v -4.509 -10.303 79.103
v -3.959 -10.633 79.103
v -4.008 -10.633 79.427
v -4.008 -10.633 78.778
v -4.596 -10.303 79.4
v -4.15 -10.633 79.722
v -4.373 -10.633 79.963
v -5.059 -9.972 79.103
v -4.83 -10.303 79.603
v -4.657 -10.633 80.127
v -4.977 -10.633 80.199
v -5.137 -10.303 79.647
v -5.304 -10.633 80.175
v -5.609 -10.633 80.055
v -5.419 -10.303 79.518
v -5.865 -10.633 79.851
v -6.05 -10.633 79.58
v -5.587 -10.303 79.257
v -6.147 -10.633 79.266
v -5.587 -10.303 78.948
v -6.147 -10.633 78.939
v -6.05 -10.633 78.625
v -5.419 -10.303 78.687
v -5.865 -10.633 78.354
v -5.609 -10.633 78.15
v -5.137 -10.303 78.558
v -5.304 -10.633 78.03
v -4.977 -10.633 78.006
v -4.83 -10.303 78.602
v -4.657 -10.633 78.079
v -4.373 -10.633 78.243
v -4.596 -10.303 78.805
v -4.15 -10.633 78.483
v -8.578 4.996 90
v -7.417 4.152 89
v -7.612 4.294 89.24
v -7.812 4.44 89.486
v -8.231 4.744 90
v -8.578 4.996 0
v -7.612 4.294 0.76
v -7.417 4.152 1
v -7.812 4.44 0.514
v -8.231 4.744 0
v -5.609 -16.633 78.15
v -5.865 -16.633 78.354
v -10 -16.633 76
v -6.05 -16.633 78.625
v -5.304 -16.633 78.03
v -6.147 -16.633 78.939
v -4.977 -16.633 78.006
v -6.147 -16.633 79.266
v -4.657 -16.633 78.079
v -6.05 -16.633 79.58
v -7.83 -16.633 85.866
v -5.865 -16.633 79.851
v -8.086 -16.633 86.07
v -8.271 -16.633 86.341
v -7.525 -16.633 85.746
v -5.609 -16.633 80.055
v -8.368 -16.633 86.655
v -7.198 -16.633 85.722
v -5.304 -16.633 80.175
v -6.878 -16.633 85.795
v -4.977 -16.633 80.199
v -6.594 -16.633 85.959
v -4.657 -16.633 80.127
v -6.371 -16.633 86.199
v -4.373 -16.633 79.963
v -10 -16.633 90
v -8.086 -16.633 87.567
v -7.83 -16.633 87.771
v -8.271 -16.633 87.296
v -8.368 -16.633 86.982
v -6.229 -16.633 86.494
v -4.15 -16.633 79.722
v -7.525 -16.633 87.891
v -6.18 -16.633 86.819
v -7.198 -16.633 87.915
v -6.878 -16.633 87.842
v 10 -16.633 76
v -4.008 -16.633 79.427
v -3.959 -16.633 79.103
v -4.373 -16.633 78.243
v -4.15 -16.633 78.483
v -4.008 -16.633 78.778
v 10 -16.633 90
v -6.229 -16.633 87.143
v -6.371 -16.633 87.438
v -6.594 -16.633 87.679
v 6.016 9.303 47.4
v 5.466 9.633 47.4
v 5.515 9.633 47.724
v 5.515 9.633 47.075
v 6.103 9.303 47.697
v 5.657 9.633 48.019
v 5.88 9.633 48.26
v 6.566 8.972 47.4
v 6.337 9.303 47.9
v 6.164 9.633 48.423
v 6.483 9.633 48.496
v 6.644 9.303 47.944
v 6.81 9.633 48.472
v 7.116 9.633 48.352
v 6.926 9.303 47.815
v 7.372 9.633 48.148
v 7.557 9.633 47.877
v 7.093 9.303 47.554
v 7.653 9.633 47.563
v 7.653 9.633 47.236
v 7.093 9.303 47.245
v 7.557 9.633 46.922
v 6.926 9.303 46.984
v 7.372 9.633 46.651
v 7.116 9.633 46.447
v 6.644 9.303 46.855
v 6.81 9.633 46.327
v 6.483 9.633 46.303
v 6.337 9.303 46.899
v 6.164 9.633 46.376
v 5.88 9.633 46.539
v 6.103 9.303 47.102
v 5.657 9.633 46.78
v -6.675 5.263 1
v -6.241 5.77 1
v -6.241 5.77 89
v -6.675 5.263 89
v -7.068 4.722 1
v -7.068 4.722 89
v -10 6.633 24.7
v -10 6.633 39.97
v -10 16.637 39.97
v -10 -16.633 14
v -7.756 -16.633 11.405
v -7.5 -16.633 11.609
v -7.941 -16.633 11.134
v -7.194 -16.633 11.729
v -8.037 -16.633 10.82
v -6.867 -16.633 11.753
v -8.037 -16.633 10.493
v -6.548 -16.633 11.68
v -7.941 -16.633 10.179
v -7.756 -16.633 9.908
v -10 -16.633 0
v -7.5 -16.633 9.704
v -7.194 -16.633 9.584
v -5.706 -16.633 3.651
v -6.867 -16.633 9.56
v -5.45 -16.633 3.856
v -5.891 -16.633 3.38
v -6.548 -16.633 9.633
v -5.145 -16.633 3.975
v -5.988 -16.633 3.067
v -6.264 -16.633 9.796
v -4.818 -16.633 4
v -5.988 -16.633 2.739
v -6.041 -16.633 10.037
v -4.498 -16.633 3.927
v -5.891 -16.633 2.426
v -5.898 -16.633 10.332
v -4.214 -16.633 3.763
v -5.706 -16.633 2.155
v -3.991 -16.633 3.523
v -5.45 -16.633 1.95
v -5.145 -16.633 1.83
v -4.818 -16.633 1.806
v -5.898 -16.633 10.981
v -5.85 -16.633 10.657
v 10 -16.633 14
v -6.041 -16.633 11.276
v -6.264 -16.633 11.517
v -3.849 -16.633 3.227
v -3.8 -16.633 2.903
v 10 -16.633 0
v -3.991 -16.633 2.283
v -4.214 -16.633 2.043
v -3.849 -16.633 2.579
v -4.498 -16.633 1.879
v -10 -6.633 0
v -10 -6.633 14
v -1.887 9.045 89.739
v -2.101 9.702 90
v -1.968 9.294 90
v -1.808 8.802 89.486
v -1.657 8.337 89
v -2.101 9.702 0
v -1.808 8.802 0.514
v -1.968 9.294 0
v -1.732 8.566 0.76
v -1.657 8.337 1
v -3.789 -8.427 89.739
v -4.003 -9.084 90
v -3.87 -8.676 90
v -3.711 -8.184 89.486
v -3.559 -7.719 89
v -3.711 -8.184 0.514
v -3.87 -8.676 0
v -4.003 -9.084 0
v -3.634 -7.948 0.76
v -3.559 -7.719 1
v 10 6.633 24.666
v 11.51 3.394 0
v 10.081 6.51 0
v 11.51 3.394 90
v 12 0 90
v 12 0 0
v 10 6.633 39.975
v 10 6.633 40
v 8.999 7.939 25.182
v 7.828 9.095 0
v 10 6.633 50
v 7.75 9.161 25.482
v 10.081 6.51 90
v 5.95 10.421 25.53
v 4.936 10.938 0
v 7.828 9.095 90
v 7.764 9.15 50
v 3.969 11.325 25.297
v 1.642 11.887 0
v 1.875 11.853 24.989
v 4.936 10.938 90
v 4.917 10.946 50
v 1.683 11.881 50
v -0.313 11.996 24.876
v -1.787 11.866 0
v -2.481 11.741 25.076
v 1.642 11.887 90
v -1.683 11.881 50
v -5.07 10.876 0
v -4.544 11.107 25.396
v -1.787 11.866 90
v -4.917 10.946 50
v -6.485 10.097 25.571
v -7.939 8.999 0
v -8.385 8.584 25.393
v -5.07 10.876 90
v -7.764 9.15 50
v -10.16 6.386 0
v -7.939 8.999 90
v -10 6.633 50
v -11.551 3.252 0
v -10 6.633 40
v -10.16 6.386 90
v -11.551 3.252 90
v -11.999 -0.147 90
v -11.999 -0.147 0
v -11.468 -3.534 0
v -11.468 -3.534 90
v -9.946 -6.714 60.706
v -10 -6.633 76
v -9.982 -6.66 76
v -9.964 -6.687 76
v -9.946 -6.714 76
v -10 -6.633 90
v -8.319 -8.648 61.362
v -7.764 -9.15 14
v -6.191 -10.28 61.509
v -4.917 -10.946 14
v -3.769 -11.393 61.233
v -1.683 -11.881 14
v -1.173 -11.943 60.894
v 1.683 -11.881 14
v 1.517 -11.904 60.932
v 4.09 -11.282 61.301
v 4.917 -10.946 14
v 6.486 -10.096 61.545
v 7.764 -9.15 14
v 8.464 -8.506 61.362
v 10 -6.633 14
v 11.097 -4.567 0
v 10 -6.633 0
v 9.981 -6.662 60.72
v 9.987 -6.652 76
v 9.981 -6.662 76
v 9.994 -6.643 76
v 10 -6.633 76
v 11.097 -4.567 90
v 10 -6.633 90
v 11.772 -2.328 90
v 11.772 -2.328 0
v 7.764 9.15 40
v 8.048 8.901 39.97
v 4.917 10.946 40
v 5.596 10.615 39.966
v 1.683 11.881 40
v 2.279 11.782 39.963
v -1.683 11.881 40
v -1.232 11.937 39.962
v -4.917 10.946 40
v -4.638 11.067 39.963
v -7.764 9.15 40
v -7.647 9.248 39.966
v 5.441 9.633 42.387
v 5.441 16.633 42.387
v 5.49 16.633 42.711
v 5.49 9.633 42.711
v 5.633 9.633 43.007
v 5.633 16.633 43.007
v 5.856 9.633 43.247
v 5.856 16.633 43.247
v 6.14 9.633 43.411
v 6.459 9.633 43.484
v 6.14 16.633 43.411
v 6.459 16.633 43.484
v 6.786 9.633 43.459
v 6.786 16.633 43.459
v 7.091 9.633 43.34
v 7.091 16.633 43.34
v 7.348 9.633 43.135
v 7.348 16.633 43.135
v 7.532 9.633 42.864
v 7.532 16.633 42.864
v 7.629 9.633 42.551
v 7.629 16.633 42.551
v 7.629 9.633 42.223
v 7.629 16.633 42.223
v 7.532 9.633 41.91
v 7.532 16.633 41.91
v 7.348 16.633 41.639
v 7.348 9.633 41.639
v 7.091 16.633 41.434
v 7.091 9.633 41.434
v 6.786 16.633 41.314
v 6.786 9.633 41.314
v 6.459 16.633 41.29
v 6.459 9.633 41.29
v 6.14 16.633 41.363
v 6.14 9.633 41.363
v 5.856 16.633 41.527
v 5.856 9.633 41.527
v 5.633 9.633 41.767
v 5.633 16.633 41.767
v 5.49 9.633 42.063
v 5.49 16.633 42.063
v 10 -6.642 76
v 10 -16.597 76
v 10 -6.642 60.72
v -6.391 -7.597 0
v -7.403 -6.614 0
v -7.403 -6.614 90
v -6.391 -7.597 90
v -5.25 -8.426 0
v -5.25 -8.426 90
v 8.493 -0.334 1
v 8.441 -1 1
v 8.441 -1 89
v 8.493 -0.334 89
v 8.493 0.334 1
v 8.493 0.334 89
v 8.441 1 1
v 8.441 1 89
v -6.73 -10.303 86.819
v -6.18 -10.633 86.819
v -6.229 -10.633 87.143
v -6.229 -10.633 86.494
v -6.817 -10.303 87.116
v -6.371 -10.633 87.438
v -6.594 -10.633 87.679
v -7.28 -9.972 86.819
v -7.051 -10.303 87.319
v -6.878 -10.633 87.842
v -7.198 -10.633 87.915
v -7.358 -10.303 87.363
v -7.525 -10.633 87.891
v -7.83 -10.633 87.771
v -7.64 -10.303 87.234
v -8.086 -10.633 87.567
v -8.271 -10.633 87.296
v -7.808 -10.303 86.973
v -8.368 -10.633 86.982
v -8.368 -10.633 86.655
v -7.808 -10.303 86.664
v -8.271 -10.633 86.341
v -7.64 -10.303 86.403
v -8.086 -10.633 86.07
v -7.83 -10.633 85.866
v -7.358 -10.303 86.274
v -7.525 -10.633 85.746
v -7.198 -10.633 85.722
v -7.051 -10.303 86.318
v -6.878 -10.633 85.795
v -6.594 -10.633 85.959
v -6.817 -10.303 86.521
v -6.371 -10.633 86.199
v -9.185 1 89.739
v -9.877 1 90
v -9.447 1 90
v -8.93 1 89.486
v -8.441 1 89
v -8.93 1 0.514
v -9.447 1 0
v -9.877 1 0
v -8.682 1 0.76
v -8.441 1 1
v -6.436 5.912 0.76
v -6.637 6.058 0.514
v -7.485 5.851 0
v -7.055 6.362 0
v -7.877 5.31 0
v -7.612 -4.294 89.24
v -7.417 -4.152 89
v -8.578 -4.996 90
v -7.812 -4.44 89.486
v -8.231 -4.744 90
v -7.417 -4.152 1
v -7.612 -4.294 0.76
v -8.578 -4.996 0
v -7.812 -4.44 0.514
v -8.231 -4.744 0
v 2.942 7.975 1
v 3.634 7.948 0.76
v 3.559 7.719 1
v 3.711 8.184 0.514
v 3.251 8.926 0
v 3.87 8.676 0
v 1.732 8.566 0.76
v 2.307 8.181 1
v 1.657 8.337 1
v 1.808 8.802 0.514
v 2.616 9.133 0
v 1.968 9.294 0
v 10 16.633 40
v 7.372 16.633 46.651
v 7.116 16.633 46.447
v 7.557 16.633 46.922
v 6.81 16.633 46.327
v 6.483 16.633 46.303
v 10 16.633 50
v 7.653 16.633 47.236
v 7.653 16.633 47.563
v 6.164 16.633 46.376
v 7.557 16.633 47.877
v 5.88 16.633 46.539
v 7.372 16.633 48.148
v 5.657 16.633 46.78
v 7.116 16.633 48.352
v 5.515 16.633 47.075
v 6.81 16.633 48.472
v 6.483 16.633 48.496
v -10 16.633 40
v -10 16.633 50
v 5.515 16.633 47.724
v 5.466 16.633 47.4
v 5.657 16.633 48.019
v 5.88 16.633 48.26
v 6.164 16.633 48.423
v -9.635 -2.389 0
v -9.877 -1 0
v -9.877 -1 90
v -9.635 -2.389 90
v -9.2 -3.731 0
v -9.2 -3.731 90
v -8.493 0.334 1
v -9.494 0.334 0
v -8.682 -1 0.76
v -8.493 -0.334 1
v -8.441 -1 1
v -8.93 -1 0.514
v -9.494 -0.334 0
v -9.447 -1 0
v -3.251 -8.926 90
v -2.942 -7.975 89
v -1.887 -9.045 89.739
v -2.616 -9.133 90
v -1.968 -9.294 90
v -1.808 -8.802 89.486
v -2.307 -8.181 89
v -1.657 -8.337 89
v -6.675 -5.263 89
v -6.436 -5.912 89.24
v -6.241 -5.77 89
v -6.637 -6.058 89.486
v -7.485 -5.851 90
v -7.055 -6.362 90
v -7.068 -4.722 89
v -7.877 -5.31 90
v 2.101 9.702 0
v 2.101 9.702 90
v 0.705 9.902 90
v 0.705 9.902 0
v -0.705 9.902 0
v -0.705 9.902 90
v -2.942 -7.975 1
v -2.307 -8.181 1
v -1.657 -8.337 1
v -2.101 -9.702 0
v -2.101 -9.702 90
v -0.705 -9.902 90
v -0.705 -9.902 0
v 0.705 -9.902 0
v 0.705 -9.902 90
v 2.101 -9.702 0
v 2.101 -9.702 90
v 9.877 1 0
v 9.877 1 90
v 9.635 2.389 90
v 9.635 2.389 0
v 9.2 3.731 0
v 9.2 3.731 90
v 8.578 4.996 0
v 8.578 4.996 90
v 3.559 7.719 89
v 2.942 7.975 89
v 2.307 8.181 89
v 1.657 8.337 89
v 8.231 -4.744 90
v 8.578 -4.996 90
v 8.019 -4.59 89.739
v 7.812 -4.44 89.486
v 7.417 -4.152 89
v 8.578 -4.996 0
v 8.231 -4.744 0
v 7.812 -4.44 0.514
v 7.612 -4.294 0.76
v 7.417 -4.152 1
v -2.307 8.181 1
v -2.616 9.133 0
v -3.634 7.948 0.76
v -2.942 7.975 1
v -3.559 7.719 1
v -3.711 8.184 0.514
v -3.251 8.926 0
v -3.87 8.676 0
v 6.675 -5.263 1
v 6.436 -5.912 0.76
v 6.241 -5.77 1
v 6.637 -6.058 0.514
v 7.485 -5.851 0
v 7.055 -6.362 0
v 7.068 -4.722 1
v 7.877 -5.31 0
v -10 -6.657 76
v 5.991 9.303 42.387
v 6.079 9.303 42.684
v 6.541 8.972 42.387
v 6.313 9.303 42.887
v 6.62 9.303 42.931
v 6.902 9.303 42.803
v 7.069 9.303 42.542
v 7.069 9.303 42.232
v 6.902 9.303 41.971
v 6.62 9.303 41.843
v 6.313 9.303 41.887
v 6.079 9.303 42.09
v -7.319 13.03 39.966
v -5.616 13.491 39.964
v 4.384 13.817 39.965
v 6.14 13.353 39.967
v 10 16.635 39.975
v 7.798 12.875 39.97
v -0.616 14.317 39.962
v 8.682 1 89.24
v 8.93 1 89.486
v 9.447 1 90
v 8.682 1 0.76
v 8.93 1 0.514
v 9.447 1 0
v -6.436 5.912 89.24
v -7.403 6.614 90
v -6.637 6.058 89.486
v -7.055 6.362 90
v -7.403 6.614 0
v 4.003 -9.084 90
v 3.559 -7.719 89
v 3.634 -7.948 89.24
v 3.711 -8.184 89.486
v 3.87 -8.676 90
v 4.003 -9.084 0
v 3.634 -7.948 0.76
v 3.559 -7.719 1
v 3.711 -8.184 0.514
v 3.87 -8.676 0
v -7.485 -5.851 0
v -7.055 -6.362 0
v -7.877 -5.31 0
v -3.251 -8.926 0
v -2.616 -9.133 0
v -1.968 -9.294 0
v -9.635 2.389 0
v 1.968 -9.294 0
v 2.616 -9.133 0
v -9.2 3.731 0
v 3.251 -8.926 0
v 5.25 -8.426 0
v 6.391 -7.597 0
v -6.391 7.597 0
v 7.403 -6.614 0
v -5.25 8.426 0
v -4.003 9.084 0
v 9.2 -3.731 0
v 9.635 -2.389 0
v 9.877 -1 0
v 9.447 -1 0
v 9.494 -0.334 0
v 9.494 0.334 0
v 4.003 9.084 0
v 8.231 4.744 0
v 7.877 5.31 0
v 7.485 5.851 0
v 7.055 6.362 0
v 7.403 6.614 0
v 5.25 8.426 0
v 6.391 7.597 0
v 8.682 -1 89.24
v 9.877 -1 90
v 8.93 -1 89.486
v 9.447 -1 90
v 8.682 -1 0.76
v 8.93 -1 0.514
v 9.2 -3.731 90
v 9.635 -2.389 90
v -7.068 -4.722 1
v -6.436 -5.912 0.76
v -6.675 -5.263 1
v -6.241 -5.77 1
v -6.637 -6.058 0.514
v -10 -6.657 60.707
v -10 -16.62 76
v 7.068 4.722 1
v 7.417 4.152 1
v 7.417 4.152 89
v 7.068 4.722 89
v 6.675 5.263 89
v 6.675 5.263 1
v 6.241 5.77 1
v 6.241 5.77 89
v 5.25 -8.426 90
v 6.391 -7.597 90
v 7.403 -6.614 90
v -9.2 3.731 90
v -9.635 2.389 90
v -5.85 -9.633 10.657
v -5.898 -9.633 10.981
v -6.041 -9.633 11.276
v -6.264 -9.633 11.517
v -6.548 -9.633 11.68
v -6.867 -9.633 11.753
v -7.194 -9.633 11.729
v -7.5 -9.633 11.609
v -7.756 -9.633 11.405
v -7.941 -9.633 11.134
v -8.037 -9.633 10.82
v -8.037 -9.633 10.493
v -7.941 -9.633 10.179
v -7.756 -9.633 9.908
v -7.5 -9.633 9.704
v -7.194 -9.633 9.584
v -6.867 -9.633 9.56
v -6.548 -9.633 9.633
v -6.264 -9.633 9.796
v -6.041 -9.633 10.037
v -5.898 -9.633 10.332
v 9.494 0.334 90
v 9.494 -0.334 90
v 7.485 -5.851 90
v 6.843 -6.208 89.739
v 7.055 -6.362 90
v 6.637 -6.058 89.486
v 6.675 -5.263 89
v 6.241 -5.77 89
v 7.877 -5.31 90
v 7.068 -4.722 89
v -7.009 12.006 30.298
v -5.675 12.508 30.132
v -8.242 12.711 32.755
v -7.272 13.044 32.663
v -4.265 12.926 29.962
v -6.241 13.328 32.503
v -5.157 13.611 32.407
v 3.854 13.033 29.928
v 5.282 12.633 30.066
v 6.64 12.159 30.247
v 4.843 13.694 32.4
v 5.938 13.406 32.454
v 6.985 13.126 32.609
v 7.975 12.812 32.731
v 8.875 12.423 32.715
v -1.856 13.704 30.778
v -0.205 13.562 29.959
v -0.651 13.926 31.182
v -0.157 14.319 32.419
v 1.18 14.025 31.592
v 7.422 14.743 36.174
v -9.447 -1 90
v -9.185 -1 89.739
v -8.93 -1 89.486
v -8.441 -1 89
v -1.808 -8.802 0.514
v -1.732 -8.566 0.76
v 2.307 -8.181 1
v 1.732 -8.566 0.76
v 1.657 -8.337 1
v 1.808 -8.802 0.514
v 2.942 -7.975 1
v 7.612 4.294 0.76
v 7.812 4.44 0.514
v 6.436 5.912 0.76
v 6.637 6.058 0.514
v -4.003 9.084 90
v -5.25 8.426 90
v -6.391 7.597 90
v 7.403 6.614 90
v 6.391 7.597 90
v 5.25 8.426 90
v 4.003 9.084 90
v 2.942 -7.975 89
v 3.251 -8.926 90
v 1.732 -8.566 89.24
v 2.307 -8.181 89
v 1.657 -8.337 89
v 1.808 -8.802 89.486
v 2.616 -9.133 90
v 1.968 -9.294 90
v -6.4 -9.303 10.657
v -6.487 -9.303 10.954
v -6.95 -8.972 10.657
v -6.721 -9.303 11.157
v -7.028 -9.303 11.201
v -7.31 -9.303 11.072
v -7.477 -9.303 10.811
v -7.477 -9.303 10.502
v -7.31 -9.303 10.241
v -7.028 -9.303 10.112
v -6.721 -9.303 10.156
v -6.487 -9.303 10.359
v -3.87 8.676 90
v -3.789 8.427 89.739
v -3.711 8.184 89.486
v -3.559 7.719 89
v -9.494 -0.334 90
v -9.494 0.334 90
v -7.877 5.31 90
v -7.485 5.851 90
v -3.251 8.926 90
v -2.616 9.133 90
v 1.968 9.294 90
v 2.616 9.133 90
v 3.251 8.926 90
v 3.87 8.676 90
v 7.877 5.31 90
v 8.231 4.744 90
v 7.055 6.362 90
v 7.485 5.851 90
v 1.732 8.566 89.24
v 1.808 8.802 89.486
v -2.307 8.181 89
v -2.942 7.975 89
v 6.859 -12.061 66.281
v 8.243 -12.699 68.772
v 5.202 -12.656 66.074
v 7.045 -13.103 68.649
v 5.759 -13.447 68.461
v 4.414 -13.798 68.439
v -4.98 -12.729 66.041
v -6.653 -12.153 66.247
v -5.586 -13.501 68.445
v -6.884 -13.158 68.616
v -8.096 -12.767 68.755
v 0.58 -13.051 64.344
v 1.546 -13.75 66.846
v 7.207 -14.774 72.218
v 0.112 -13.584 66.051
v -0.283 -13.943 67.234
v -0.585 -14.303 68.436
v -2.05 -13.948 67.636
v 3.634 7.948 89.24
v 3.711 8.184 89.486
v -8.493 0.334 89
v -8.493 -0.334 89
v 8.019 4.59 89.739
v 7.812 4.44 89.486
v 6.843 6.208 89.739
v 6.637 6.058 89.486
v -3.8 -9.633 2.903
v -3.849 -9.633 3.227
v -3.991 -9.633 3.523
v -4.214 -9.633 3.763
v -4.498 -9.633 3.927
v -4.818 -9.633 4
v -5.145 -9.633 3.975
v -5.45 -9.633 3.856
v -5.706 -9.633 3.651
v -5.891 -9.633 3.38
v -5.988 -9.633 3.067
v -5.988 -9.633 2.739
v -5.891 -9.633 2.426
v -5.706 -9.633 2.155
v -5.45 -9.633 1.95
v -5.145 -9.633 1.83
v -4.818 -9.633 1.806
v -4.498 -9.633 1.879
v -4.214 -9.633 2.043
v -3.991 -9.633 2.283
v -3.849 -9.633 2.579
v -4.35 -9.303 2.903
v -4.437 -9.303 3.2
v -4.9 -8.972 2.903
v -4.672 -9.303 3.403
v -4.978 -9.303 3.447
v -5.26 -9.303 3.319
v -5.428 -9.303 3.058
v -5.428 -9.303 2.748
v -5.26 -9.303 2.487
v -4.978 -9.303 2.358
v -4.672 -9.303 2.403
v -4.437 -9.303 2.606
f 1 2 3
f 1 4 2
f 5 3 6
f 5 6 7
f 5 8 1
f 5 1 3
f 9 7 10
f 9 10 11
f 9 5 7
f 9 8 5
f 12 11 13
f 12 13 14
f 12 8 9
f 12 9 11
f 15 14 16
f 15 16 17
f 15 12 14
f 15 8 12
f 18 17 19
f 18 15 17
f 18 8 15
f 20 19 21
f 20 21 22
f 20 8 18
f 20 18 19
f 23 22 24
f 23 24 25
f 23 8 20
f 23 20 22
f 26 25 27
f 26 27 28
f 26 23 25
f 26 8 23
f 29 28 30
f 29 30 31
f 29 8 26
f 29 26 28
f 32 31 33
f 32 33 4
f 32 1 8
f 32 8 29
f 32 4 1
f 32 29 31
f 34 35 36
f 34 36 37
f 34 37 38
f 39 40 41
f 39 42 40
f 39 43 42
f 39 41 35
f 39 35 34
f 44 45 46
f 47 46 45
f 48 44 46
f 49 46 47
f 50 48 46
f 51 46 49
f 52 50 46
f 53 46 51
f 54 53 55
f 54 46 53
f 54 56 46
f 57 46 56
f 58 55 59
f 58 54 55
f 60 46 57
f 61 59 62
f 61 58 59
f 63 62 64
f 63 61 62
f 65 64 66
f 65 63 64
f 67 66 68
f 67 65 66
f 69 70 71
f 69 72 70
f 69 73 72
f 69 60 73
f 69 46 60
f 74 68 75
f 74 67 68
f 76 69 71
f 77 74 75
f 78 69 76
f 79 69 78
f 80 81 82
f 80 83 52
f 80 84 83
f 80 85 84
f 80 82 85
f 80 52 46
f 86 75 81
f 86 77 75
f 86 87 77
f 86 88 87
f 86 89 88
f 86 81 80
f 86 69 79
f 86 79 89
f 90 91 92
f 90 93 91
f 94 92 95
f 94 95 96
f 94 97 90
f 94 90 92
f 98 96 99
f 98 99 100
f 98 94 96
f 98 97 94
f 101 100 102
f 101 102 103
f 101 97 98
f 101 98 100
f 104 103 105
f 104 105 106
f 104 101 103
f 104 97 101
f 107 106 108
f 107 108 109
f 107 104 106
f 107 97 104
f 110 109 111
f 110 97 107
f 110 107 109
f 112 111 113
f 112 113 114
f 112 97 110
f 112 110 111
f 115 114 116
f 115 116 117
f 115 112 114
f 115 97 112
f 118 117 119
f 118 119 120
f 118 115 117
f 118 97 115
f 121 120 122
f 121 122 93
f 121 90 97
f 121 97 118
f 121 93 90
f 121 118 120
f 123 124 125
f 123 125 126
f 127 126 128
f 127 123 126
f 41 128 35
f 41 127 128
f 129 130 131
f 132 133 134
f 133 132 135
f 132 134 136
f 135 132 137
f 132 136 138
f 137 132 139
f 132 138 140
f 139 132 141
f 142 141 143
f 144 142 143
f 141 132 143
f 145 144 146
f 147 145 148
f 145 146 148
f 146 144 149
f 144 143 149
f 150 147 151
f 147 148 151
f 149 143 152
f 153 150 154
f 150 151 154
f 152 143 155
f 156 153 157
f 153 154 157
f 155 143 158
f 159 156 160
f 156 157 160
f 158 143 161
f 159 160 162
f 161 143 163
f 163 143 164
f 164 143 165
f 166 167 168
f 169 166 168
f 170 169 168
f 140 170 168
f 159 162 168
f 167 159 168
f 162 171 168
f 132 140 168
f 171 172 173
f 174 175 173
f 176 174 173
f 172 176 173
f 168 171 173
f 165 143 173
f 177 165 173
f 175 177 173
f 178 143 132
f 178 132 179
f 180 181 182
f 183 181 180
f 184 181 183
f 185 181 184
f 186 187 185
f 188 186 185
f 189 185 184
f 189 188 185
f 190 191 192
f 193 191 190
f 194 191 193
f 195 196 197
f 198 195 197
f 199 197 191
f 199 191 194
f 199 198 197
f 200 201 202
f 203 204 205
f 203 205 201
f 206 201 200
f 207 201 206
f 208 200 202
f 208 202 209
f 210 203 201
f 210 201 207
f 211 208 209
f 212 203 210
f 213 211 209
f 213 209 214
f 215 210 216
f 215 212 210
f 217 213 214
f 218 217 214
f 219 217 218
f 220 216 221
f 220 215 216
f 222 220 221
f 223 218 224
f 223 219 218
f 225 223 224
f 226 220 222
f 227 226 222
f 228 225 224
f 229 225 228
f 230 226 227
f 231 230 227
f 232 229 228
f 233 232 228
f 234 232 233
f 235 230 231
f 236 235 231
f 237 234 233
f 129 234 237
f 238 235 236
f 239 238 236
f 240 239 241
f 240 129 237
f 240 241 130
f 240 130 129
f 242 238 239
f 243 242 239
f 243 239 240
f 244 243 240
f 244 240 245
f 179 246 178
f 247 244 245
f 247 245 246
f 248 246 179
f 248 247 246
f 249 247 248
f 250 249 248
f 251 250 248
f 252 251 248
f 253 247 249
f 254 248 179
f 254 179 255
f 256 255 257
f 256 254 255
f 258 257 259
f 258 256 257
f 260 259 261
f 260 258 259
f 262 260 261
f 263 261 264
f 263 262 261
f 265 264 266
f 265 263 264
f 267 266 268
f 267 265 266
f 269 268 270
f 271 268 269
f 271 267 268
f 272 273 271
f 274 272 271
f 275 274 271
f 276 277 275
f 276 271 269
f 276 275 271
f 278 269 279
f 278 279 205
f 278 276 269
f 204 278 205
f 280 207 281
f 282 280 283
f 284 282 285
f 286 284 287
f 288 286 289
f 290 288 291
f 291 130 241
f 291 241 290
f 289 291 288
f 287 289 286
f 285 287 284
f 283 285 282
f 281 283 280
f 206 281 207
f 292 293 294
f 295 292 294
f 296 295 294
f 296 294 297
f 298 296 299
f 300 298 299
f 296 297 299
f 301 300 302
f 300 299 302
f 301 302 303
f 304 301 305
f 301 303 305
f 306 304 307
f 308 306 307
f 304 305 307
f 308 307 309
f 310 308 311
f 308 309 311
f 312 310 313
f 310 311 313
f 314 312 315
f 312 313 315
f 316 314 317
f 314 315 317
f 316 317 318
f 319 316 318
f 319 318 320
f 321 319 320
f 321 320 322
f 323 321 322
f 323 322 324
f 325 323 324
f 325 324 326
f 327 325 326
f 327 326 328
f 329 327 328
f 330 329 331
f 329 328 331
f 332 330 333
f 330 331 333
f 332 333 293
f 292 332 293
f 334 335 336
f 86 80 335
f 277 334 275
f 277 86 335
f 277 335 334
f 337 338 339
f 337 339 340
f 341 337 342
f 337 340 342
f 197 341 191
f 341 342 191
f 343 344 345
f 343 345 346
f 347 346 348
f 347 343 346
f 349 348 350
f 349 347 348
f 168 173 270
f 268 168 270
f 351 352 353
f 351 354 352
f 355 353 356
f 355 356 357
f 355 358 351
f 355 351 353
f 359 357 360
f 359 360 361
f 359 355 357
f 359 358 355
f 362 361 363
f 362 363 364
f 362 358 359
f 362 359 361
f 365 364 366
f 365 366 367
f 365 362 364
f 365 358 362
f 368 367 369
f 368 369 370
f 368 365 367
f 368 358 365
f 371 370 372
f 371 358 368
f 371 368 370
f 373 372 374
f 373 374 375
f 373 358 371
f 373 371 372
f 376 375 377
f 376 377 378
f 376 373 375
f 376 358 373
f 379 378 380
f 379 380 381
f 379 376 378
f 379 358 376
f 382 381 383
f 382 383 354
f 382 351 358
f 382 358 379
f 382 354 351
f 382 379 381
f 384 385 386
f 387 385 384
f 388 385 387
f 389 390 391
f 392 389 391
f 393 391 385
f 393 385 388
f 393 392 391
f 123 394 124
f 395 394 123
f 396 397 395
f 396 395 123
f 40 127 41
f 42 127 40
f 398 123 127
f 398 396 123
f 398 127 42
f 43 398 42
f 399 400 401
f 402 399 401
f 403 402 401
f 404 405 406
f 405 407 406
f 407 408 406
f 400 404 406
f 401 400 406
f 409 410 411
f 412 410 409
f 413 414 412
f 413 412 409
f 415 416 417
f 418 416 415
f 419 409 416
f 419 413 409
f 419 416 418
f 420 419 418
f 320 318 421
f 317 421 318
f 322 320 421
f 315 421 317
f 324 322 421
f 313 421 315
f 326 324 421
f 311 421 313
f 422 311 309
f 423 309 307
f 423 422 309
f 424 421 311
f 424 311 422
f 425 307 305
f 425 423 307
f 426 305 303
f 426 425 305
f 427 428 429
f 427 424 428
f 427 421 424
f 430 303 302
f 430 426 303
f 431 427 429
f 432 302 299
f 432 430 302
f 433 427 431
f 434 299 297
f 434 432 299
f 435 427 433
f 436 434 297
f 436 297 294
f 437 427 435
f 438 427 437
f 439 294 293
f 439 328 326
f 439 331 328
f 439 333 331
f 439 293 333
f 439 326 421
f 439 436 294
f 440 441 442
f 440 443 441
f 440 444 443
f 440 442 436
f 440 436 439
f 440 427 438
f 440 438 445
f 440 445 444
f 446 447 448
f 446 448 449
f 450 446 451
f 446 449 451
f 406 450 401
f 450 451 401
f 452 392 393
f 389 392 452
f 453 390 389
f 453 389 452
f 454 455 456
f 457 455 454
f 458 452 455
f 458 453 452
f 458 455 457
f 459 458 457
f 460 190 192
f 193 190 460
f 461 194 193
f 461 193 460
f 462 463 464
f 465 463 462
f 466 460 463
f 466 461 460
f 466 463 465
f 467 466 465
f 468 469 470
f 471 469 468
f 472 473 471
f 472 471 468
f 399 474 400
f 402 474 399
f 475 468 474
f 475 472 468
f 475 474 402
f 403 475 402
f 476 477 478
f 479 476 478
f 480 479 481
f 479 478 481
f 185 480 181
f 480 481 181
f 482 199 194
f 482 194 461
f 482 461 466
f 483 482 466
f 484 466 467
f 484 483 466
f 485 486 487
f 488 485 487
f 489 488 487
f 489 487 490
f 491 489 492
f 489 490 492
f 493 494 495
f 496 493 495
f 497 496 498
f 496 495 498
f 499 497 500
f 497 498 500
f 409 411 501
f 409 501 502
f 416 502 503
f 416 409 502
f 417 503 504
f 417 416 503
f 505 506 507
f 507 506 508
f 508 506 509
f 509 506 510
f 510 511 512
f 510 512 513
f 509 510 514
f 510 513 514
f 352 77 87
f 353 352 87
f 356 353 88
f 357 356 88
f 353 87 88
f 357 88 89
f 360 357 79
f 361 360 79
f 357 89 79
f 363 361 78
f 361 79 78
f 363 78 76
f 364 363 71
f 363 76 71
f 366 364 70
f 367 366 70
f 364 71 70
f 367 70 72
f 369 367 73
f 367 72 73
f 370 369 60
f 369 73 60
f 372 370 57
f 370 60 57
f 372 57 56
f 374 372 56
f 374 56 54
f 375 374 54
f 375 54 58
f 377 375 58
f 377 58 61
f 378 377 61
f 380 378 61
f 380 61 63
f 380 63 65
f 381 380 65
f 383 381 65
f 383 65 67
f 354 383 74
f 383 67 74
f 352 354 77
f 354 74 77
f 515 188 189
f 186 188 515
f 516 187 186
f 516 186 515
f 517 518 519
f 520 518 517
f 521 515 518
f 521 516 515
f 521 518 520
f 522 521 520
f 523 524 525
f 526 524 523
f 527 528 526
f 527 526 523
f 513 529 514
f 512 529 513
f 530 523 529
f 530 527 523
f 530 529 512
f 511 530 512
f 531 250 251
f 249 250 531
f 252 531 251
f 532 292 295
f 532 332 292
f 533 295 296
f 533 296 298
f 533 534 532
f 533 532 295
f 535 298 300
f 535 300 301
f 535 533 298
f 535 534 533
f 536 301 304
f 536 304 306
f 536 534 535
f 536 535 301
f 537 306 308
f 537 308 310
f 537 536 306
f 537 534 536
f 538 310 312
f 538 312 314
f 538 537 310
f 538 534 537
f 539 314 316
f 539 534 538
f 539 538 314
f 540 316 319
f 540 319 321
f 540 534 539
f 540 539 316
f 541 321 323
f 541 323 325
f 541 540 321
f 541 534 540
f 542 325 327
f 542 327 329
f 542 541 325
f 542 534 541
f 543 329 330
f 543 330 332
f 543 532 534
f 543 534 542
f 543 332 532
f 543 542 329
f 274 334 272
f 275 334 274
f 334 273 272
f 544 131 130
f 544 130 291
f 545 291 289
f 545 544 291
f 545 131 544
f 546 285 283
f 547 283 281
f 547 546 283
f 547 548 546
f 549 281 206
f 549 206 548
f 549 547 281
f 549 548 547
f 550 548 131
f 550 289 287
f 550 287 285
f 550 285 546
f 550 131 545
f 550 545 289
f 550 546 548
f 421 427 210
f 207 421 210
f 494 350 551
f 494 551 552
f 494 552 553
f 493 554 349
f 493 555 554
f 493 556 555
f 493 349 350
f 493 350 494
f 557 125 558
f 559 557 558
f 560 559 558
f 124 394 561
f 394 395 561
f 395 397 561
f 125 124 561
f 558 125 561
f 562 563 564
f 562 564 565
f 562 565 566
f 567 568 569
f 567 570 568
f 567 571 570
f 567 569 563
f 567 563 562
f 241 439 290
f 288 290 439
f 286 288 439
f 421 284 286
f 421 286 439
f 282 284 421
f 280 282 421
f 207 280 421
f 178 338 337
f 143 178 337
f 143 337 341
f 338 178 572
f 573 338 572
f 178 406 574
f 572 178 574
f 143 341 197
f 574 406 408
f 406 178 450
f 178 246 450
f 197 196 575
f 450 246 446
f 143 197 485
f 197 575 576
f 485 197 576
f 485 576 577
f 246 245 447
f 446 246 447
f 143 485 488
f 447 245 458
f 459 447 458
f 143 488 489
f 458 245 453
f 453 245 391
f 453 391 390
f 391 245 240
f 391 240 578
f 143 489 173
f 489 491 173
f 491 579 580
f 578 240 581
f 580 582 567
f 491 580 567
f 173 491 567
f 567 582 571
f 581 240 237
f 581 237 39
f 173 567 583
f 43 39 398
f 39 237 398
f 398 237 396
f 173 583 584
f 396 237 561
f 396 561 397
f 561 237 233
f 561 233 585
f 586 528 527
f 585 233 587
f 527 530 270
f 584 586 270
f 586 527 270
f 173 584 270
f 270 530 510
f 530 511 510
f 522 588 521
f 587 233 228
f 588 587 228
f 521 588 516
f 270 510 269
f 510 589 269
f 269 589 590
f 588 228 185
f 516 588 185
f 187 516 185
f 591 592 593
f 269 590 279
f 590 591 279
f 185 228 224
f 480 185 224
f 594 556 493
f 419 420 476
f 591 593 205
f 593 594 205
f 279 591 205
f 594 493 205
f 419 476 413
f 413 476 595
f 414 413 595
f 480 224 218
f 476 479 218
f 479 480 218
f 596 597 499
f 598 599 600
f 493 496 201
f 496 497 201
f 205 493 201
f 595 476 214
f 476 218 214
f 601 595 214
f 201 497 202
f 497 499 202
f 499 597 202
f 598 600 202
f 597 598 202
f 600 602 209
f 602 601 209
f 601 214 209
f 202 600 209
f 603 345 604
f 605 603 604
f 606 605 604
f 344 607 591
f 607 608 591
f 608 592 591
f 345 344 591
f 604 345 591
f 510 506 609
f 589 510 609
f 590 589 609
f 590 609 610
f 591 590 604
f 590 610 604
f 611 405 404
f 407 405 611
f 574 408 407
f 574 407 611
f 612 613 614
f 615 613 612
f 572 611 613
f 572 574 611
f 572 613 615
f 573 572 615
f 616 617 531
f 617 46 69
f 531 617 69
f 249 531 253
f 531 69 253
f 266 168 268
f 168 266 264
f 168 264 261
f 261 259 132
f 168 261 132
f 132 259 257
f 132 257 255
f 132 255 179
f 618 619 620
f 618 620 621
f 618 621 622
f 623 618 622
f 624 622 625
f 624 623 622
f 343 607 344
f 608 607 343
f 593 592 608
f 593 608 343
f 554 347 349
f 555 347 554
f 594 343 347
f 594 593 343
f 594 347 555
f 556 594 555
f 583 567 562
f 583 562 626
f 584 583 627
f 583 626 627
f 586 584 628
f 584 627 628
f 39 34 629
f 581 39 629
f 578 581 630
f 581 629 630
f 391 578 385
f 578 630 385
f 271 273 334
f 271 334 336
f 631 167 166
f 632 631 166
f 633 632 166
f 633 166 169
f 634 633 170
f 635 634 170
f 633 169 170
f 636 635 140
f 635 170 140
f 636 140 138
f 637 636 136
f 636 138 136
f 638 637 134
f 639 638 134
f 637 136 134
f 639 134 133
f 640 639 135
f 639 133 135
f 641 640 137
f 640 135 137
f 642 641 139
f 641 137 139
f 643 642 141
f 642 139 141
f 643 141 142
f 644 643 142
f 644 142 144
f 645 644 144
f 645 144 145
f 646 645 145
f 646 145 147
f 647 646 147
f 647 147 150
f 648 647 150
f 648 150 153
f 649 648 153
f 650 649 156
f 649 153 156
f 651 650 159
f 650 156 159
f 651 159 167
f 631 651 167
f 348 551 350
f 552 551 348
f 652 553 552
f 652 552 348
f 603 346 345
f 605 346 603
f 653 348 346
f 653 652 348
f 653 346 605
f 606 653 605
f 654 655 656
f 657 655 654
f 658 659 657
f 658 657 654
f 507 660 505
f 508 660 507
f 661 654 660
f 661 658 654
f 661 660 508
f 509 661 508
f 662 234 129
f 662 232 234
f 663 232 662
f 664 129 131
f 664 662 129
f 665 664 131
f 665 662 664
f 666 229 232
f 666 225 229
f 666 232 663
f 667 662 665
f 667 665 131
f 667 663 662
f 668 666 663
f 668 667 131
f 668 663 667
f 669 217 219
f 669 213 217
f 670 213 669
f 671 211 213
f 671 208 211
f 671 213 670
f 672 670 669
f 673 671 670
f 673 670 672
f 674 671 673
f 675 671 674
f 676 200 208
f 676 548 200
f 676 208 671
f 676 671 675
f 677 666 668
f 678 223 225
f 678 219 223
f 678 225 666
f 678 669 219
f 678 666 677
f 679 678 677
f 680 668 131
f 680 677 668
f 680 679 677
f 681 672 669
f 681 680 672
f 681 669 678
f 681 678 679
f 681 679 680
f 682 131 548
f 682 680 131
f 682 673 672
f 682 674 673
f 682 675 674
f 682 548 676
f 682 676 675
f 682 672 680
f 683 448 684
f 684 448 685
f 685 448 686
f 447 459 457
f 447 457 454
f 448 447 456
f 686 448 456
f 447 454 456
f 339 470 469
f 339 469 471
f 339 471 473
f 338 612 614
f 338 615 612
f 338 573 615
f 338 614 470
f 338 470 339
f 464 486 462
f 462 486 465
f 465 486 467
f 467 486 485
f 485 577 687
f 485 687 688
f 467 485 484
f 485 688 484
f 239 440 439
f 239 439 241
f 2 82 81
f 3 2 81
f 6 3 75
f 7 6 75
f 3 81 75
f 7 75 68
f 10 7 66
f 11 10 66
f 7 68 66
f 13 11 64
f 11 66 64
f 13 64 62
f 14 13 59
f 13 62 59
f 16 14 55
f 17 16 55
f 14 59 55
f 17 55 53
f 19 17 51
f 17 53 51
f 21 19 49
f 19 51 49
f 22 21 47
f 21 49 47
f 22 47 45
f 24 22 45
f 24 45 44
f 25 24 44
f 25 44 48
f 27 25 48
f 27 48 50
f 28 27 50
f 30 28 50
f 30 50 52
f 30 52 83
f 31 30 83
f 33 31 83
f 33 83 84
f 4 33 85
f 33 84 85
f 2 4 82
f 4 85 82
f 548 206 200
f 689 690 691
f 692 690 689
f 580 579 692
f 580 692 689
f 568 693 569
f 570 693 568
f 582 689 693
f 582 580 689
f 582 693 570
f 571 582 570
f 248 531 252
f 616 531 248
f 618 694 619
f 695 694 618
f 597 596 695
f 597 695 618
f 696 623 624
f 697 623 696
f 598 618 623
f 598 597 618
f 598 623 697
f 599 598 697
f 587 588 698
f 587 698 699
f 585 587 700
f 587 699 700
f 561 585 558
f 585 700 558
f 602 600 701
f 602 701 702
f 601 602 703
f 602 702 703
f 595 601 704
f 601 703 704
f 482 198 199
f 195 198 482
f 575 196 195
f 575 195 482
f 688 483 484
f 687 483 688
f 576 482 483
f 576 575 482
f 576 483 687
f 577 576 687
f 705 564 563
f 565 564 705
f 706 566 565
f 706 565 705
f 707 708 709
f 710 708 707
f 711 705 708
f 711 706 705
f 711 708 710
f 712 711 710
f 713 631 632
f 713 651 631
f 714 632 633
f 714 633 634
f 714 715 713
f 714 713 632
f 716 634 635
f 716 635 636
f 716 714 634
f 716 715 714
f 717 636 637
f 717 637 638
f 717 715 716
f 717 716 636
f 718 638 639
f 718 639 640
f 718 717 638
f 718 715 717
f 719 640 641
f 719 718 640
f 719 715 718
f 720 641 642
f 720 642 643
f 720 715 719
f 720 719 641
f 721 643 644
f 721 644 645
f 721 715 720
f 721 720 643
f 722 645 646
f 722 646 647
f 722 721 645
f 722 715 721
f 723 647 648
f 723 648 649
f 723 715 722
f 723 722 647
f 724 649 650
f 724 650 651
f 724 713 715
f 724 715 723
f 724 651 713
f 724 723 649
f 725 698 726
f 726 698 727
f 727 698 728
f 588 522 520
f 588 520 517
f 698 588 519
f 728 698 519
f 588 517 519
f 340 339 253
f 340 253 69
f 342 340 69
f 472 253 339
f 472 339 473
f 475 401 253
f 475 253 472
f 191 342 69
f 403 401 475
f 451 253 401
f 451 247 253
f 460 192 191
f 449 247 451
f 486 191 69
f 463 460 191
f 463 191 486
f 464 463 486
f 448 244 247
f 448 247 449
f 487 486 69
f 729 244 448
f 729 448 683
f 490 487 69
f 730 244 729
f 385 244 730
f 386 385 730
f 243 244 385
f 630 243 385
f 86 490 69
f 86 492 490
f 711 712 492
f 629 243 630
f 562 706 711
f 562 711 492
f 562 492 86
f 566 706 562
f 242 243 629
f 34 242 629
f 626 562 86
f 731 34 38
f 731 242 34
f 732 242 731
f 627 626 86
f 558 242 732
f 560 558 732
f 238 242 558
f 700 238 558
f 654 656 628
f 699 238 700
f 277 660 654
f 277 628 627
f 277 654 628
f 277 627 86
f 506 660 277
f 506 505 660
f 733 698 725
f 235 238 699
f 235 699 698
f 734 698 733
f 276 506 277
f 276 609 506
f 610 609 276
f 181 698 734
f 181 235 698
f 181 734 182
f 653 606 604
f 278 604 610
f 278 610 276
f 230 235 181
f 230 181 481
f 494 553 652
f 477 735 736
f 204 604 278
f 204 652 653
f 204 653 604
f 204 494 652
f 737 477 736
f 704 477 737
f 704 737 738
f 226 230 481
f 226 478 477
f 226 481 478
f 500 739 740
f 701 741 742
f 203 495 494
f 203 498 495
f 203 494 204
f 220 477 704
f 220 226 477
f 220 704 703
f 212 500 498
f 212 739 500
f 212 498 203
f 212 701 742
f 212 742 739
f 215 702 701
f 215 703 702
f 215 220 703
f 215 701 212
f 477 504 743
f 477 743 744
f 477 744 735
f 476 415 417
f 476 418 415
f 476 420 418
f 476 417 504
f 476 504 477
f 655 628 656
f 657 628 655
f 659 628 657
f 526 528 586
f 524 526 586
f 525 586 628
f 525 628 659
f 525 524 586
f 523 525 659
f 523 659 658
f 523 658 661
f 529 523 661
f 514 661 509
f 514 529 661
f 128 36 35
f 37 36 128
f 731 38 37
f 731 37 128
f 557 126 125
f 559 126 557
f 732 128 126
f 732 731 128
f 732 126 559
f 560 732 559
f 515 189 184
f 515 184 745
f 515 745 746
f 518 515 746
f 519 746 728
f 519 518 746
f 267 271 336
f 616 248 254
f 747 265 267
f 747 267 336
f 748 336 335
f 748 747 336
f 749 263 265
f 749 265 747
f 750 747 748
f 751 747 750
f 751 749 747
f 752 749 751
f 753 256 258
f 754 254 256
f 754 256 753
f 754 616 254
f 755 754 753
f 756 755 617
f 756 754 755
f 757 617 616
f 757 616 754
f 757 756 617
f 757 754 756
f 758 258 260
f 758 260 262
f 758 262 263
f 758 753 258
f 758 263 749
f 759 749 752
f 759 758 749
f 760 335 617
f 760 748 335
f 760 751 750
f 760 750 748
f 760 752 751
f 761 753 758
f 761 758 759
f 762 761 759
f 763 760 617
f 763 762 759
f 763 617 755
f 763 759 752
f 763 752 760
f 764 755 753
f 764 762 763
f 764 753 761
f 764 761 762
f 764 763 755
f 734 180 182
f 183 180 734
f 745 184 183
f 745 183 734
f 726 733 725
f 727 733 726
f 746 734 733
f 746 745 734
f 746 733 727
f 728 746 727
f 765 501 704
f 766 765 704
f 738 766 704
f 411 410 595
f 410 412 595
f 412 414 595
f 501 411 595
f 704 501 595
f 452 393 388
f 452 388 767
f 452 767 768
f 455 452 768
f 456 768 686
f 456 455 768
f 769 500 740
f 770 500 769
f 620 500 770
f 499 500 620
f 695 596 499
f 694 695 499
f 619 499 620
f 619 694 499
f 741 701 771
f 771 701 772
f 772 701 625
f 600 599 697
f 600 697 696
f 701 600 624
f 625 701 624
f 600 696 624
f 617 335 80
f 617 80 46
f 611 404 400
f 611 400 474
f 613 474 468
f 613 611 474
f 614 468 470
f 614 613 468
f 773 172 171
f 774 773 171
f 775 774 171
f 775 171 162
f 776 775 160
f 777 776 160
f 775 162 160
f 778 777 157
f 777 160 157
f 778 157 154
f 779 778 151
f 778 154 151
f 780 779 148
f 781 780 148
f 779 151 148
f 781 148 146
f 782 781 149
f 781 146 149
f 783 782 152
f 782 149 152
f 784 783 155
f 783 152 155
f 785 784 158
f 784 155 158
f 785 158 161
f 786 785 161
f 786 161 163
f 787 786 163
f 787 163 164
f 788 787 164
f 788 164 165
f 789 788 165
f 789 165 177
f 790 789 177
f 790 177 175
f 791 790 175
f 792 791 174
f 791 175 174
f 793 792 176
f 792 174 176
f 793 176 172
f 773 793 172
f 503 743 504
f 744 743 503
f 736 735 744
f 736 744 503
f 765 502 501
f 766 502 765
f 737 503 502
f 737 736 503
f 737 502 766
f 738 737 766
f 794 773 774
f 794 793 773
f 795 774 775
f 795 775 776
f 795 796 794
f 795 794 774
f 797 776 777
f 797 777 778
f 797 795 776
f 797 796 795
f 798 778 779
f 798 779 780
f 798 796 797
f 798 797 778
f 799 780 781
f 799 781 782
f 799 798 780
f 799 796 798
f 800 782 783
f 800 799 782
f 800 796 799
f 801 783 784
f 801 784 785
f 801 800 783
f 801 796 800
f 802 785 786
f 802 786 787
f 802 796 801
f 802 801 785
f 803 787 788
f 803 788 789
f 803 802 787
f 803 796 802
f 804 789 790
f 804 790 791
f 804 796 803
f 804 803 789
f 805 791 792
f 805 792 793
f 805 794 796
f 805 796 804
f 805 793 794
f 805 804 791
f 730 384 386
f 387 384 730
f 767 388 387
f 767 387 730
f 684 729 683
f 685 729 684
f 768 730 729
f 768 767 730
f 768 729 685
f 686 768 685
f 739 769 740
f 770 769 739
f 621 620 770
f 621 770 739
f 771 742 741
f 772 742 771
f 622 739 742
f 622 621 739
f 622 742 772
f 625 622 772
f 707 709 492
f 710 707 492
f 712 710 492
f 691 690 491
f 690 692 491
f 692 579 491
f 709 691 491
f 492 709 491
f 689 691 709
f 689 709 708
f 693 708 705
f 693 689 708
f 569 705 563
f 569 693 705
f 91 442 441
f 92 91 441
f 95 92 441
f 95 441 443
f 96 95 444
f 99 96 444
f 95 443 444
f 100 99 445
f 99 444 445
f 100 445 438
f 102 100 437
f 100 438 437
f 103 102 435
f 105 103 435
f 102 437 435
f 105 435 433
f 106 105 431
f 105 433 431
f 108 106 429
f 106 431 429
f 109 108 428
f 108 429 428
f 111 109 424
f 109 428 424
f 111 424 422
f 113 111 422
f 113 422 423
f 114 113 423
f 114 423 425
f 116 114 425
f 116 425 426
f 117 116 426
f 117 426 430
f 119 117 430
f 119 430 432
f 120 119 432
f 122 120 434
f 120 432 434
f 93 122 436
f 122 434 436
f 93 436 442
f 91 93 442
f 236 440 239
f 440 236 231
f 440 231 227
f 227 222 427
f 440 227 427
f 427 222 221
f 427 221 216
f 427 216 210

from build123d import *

# Parameters (mm, degrees)
CYLINDER_R     = 8.5
CYLINDER_DEPTH = 90
BOX_W          = 20
BOX_H          = 2
BOX_DEPTH      = 90
CHAMFER_SIZE   = 1
ARRAY_COUNT    = 5
SKETCH_R       = 12
SKETCH_R_2     = 9.92732
PAD_DEPTH      = 90
PAD001_DEPTH   = 14
PAD002_DEPTH   = 14
SKETCH005_R    = 1.1
HOLE_DEPTH     = 6
HOLE_TIPS_R    = 1.1
SKETCH006_R    = 1.1
HOLE001_DEPTH  = 7
HOLE001_TIPS_R = 1.1
PAD005_DEPTH   = 10
SKETCH034_R    = 1.1
HOLE002_DEPTH  = 7
HOLE002_TIPS_R = 1.1


with BuildPart() as cylinder:
    # Cylinder → Cylinder (new body)
    with BuildSketch(Plane.XY):
        Circle(CYLINDER_R)
    extrude(amount=CYLINDER_DEPTH)


with BuildPart() as main_circuit:
    # Box → Box (new body)
    with BuildSketch(Plane(origin=(-10, -1, 0), x_dir=(1, 0, 0), z_dir=(0, 0, 1))):
        with Locations((10, 1)):
            Rectangle(BOX_W, BOX_H)
    extrude(amount=BOX_DEPTH)

    # Cut: cut Cylinder
    add(cylinder.part, mode=Mode.SUBTRACT)

    # Chamfer
    chamfer_edges = [main_circuit.edges().sort_by_distance(p)[0] for p in [
        (-8.5, 0, 90),
        (-8.5, 0, 0),
        (8.48523, -0.50087, 0),
        (8.48523, 0.50087, 0),
        (8.48523, -0.50087, 90),
        (8.48523, 0.50087, 90),
    ]]
    chamfer(chamfer_edges, length=CHAMFER_SIZE)

    # Array: main_circuit ×5 about axis
    array_axis = Axis((0, 0, 0), (0, 0, 1))


with BuildPart() as main_circuit_1:
    add(main_circuit.part)
    for i in range(1, ARRAY_COUNT):
        add(main_circuit.part.rotate(array_axis, i * 360 / ARRAY_COUNT))

    # Sketch (on Face14 of Chamfer) → Pad (new body)
    with BuildSketch(Plane.XY.offset(90)):
        Circle(SKETCH_R)
        Circle(SKETCH_R_2, mode=Mode.SUBTRACT)
    extrude(amount=-PAD_DEPTH)

    # Sketch001 (on Face2 of Pad) → Pad001 (join)
    with BuildSketch(Plane.XY.offset(90)):
        with BuildLine():
            ThreePointArc((-10, -6.63325), (0, -12), (10, -6.63325))
            Line((10, -16.63325), (10, -6.63325))
            Line((-10, -16.63325), (10, -16.63325))
            Line((-10, -16.63325), (-10, -6.63325))
        make_face()
    extrude(amount=-PAD001_DEPTH)

    # Sketch003 (on Face2 of Pad) → Pad002 (join)
    with BuildSketch(Plane.XY):
        with BuildLine():
            ThreePointArc((-10, -6.63325), (0, -12), (10, -6.63325))
            Line((10, -16.63325), (10, -6.63325))
            Line((-10, -16.63325), (10, -16.63325))
            Line((-10, -16.63325), (-10, -6.63325))
        make_face()
    extrude(amount=PAD002_DEPTH)

    # Sketch005 → Hole (cut)
    with BuildSketch(Plane.XZ.offset(16.63325)):
        with Locations((-7.279865, 86.818527)):
            Circle(SKETCH005_R)
        with Locations((-5.058943, 79.102539)):
            Circle(SKETCH005_R)
    extrude(amount=-HOLE_DEPTH, mode=Mode.SUBTRACT)

    # Hole tips → Hole tip 1 section 0
    with BuildSketch(Plane.XZ.offset(10.63325), mode=Mode.PRIVATE) as hole_tip_1_s0:
        with Locations((-7.279865, 86.818527)):
            Circle(HOLE_TIPS_R)
    loft([hole_tip_1_s0.sketch, Vertex(-7.279865, -9.972303, 86.818527)], mode=Mode.SUBTRACT)

    # Hole tips → Hole tip 2 section 0
    with BuildSketch(Plane.XZ.offset(10.63325), mode=Mode.PRIVATE) as hole_tip_2_s0:
        with Locations((-5.058943, 79.102539)):
            Circle(HOLE_TIPS_R)
    loft([hole_tip_2_s0.sketch, Vertex(-5.058943, -9.972303, 79.102539)], mode=Mode.SUBTRACT)

    # Sketch006 (on Face31 of Hole) → Hole001 (cut)
    with BuildSketch(Plane.XZ.offset(16.63325)):
        with Locations((-6.949521, 10.656509)):
            Circle(SKETCH006_R)
        with Locations((-4.900103, 2.902877)):
            Circle(SKETCH006_R)
    extrude(amount=-HOLE001_DEPTH, mode=Mode.SUBTRACT)

    # Hole001 tips → Hole001 tip 1 section 0
    with BuildSketch(Plane.XZ.offset(9.63325), mode=Mode.PRIVATE) as hole001_tip_1_s0:
        with Locations((-6.949521, 10.656509)):
            Circle(HOLE001_TIPS_R)
    loft([hole001_tip_1_s0.sketch, Vertex(-6.949521, -8.972303, 10.656509)], mode=Mode.SUBTRACT)

    # Hole001 tips → Hole001 tip 2 section 0
    with BuildSketch(Plane.XZ.offset(9.63325), mode=Mode.PRIVATE) as hole001_tip_2_s0:
        with Locations((-4.900103, 2.902877)):
            Circle(HOLE001_TIPS_R)
    loft([hole001_tip_2_s0.sketch, Vertex(-4.900103, -8.972303, 2.902877)], mode=Mode.SUBTRACT)

    # Sketch002 (on Face2 of Pad) → Pad005 (join)
    with BuildSketch(Plane(origin=(0, 0, 50), x_dir=(-1, 0, 0), z_dir=(0, 0, 1))):
        with BuildLine():
            ThreePointArc((-10, -6.63325), (0, -12), (10, -6.63325))
            Line((10, -16.63325), (10, -6.63325))
            Line((-10, -16.63325), (10, -16.63325))
            Line((-10, -16.63325), (-10, -6.63325))
        make_face()
    extrude(amount=-PAD005_DEPTH)

    # Sketch008 (on Face12 of Pad005) → AdditiveLoft section 0
    with BuildSketch(Plane(origin=(-10, 0, 0), x_dir=(0, -1, 0), z_dir=(-1, 0, 0))):
        Polygon((-16.636869, 39.970264), (-6.629684, 39.970264), (-6.629684, 24.694645), align=None)
    # Sketch009 (on Face12 of Pad005) → AdditiveLoft section 1
    with BuildSketch(Plane(origin=(0, 0, 0), x_dir=(0, -1, 0), z_dir=(-1, 0, 0))):
        Polygon((-16.637928, 39.961704), (-11.980004, 39.961704), (-11.980004, 24.806454), align=None)
    # Sketch010 (on Face12 of Pad005) → AdditiveLoft section 2
    with BuildSketch(Plane(origin=(10, 0, 0), x_dir=(0, -1, 0), z_dir=(-1, 0, 0))):
        Polygon((-16.634577, 39.974693), (-6.626975, 39.974693), (-6.626975, 24.656189), align=None)
    loft()

    # Sketch011 (on Face9 of AdditiveLoft) → AdditiveLoft001 section 0
    with BuildSketch(Plane.YZ.offset(10)):
        Polygon((-16.623207, 76.040215), (-6.641595, 76.040215), (-6.641595, 60.720215), align=None)
    # Sketch013 (on Face9 of AdditiveLoft) → AdditiveLoft001 section 1
    with BuildSketch(Plane.YZ):
        Polygon((-16.617746, 76.00518), (-11.950053, 76.00518), (-11.950053, 60.68518), align=None)
    # Sketch012 (on Face9 of AdditiveLoft) → AdditiveLoft001 section 2
    with BuildSketch(Plane.YZ.offset(-10)):
        Polygon((-16.629562, 76.014336), (-6.656822, 76.014336), (-6.656822, 60.706722), align=None)
    loft()

    # Sketch034 → Hole002 (cut)
    with BuildSketch(Plane(origin=(0, 16.63325, 0), x_dir=(-1, 0, 0), z_dir=(0, 1, 0))):
        with Locations((-6.56569, 47.399509)):
            Circle(SKETCH034_R)
        with Locations((-6.541382, 42.386913)):
            Circle(SKETCH034_R)
    extrude(amount=-HOLE002_DEPTH, mode=Mode.SUBTRACT)

    # Hole002 tips → Hole002 tip 1 section 0
    with BuildSketch(Plane(origin=(0, 9.63325, 0), x_dir=(-1, 0, 0), z_dir=(0, 1, 0)), mode=Mode.PRIVATE) as hole002_tip_1_s0:
        with Locations((-6.56569, 47.399509)):
            Circle(HOLE002_TIPS_R)
    loft([hole002_tip_1_s0.sketch, Vertex(6.56569, 8.972303, 47.399509)], mode=Mode.SUBTRACT)

    # Hole002 tips → Hole002 tip 2 section 0
    with BuildSketch(Plane(origin=(0, 9.63325, 0), x_dir=(-1, 0, 0), z_dir=(0, 1, 0)), mode=Mode.PRIVATE) as hole002_tip_2_s0:
        with Locations((-6.541382, 42.386913)):
            Circle(HOLE002_TIPS_R)
    loft([hole002_tip_2_s0.sketch, Vertex(6.541382, 8.972303, 42.386913)], mode=Mode.SUBTRACT)


solid = main_circuit_1.part
